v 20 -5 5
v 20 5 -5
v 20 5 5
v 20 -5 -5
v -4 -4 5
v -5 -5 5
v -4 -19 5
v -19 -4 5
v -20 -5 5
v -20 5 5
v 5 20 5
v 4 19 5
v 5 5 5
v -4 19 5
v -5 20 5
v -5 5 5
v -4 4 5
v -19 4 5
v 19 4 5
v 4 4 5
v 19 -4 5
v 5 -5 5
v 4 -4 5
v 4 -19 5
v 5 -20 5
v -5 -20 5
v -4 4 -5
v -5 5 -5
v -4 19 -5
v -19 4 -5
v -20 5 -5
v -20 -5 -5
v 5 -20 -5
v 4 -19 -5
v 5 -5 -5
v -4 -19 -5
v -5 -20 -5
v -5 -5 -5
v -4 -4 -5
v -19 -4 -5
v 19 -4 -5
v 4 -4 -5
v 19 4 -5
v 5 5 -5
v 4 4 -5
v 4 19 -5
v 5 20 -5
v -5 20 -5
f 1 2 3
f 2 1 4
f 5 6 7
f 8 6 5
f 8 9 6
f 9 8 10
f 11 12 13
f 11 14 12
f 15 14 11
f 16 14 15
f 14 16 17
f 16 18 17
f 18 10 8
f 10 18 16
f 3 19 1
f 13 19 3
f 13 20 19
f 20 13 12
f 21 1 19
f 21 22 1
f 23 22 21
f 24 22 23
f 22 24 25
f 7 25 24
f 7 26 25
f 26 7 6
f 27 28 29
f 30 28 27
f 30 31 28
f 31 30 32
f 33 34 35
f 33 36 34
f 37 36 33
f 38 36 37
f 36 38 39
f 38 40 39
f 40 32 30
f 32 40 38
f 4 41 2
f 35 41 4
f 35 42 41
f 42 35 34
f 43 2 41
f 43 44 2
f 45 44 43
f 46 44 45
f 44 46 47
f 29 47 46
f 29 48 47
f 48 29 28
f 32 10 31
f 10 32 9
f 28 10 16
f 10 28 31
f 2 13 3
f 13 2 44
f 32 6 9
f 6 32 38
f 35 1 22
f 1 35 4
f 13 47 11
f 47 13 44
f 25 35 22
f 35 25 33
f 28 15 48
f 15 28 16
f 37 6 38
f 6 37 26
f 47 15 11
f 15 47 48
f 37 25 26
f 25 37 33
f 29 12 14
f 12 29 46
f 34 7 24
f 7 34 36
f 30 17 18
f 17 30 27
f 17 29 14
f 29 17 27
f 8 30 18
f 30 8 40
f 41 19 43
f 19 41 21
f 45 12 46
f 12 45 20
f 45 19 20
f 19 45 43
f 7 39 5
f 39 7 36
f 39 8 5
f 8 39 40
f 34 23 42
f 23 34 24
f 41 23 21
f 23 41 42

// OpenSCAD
// file: inset.scad
module inset_shell(thickness = 0.5, bbox = [5000, 5000, 5000]) {
  module invert(bbox = [5000, 5000, 5000]) {
    difference() {
      cube(bbox, true);
      children();
    }
  }

  module inset(thickness = 0.5, bbox = [5000, 5000, 5000]) {
    render() {
      invert(0.9 * bbox)
        minkowski() {
          invert() children();
          cube([2 * thickness, 2 * thickness, 2 * thickness], center=true);
        }
    }
  }

  render() {
    difference() {
      children();
      translate([0, 0, -5 * thickness]) scale([1, 1, 100]) translate([0, 0, -2 * thickness])
        inset(thickness, bbox)
          children();
    }
  }
}
// main file
use <inset.scad>

module cross(){
    cube([40, 10, 10], center = true);
    cube([10, 40, 10], center = true);
}

{
inset_shell(1)
    cross();
}
